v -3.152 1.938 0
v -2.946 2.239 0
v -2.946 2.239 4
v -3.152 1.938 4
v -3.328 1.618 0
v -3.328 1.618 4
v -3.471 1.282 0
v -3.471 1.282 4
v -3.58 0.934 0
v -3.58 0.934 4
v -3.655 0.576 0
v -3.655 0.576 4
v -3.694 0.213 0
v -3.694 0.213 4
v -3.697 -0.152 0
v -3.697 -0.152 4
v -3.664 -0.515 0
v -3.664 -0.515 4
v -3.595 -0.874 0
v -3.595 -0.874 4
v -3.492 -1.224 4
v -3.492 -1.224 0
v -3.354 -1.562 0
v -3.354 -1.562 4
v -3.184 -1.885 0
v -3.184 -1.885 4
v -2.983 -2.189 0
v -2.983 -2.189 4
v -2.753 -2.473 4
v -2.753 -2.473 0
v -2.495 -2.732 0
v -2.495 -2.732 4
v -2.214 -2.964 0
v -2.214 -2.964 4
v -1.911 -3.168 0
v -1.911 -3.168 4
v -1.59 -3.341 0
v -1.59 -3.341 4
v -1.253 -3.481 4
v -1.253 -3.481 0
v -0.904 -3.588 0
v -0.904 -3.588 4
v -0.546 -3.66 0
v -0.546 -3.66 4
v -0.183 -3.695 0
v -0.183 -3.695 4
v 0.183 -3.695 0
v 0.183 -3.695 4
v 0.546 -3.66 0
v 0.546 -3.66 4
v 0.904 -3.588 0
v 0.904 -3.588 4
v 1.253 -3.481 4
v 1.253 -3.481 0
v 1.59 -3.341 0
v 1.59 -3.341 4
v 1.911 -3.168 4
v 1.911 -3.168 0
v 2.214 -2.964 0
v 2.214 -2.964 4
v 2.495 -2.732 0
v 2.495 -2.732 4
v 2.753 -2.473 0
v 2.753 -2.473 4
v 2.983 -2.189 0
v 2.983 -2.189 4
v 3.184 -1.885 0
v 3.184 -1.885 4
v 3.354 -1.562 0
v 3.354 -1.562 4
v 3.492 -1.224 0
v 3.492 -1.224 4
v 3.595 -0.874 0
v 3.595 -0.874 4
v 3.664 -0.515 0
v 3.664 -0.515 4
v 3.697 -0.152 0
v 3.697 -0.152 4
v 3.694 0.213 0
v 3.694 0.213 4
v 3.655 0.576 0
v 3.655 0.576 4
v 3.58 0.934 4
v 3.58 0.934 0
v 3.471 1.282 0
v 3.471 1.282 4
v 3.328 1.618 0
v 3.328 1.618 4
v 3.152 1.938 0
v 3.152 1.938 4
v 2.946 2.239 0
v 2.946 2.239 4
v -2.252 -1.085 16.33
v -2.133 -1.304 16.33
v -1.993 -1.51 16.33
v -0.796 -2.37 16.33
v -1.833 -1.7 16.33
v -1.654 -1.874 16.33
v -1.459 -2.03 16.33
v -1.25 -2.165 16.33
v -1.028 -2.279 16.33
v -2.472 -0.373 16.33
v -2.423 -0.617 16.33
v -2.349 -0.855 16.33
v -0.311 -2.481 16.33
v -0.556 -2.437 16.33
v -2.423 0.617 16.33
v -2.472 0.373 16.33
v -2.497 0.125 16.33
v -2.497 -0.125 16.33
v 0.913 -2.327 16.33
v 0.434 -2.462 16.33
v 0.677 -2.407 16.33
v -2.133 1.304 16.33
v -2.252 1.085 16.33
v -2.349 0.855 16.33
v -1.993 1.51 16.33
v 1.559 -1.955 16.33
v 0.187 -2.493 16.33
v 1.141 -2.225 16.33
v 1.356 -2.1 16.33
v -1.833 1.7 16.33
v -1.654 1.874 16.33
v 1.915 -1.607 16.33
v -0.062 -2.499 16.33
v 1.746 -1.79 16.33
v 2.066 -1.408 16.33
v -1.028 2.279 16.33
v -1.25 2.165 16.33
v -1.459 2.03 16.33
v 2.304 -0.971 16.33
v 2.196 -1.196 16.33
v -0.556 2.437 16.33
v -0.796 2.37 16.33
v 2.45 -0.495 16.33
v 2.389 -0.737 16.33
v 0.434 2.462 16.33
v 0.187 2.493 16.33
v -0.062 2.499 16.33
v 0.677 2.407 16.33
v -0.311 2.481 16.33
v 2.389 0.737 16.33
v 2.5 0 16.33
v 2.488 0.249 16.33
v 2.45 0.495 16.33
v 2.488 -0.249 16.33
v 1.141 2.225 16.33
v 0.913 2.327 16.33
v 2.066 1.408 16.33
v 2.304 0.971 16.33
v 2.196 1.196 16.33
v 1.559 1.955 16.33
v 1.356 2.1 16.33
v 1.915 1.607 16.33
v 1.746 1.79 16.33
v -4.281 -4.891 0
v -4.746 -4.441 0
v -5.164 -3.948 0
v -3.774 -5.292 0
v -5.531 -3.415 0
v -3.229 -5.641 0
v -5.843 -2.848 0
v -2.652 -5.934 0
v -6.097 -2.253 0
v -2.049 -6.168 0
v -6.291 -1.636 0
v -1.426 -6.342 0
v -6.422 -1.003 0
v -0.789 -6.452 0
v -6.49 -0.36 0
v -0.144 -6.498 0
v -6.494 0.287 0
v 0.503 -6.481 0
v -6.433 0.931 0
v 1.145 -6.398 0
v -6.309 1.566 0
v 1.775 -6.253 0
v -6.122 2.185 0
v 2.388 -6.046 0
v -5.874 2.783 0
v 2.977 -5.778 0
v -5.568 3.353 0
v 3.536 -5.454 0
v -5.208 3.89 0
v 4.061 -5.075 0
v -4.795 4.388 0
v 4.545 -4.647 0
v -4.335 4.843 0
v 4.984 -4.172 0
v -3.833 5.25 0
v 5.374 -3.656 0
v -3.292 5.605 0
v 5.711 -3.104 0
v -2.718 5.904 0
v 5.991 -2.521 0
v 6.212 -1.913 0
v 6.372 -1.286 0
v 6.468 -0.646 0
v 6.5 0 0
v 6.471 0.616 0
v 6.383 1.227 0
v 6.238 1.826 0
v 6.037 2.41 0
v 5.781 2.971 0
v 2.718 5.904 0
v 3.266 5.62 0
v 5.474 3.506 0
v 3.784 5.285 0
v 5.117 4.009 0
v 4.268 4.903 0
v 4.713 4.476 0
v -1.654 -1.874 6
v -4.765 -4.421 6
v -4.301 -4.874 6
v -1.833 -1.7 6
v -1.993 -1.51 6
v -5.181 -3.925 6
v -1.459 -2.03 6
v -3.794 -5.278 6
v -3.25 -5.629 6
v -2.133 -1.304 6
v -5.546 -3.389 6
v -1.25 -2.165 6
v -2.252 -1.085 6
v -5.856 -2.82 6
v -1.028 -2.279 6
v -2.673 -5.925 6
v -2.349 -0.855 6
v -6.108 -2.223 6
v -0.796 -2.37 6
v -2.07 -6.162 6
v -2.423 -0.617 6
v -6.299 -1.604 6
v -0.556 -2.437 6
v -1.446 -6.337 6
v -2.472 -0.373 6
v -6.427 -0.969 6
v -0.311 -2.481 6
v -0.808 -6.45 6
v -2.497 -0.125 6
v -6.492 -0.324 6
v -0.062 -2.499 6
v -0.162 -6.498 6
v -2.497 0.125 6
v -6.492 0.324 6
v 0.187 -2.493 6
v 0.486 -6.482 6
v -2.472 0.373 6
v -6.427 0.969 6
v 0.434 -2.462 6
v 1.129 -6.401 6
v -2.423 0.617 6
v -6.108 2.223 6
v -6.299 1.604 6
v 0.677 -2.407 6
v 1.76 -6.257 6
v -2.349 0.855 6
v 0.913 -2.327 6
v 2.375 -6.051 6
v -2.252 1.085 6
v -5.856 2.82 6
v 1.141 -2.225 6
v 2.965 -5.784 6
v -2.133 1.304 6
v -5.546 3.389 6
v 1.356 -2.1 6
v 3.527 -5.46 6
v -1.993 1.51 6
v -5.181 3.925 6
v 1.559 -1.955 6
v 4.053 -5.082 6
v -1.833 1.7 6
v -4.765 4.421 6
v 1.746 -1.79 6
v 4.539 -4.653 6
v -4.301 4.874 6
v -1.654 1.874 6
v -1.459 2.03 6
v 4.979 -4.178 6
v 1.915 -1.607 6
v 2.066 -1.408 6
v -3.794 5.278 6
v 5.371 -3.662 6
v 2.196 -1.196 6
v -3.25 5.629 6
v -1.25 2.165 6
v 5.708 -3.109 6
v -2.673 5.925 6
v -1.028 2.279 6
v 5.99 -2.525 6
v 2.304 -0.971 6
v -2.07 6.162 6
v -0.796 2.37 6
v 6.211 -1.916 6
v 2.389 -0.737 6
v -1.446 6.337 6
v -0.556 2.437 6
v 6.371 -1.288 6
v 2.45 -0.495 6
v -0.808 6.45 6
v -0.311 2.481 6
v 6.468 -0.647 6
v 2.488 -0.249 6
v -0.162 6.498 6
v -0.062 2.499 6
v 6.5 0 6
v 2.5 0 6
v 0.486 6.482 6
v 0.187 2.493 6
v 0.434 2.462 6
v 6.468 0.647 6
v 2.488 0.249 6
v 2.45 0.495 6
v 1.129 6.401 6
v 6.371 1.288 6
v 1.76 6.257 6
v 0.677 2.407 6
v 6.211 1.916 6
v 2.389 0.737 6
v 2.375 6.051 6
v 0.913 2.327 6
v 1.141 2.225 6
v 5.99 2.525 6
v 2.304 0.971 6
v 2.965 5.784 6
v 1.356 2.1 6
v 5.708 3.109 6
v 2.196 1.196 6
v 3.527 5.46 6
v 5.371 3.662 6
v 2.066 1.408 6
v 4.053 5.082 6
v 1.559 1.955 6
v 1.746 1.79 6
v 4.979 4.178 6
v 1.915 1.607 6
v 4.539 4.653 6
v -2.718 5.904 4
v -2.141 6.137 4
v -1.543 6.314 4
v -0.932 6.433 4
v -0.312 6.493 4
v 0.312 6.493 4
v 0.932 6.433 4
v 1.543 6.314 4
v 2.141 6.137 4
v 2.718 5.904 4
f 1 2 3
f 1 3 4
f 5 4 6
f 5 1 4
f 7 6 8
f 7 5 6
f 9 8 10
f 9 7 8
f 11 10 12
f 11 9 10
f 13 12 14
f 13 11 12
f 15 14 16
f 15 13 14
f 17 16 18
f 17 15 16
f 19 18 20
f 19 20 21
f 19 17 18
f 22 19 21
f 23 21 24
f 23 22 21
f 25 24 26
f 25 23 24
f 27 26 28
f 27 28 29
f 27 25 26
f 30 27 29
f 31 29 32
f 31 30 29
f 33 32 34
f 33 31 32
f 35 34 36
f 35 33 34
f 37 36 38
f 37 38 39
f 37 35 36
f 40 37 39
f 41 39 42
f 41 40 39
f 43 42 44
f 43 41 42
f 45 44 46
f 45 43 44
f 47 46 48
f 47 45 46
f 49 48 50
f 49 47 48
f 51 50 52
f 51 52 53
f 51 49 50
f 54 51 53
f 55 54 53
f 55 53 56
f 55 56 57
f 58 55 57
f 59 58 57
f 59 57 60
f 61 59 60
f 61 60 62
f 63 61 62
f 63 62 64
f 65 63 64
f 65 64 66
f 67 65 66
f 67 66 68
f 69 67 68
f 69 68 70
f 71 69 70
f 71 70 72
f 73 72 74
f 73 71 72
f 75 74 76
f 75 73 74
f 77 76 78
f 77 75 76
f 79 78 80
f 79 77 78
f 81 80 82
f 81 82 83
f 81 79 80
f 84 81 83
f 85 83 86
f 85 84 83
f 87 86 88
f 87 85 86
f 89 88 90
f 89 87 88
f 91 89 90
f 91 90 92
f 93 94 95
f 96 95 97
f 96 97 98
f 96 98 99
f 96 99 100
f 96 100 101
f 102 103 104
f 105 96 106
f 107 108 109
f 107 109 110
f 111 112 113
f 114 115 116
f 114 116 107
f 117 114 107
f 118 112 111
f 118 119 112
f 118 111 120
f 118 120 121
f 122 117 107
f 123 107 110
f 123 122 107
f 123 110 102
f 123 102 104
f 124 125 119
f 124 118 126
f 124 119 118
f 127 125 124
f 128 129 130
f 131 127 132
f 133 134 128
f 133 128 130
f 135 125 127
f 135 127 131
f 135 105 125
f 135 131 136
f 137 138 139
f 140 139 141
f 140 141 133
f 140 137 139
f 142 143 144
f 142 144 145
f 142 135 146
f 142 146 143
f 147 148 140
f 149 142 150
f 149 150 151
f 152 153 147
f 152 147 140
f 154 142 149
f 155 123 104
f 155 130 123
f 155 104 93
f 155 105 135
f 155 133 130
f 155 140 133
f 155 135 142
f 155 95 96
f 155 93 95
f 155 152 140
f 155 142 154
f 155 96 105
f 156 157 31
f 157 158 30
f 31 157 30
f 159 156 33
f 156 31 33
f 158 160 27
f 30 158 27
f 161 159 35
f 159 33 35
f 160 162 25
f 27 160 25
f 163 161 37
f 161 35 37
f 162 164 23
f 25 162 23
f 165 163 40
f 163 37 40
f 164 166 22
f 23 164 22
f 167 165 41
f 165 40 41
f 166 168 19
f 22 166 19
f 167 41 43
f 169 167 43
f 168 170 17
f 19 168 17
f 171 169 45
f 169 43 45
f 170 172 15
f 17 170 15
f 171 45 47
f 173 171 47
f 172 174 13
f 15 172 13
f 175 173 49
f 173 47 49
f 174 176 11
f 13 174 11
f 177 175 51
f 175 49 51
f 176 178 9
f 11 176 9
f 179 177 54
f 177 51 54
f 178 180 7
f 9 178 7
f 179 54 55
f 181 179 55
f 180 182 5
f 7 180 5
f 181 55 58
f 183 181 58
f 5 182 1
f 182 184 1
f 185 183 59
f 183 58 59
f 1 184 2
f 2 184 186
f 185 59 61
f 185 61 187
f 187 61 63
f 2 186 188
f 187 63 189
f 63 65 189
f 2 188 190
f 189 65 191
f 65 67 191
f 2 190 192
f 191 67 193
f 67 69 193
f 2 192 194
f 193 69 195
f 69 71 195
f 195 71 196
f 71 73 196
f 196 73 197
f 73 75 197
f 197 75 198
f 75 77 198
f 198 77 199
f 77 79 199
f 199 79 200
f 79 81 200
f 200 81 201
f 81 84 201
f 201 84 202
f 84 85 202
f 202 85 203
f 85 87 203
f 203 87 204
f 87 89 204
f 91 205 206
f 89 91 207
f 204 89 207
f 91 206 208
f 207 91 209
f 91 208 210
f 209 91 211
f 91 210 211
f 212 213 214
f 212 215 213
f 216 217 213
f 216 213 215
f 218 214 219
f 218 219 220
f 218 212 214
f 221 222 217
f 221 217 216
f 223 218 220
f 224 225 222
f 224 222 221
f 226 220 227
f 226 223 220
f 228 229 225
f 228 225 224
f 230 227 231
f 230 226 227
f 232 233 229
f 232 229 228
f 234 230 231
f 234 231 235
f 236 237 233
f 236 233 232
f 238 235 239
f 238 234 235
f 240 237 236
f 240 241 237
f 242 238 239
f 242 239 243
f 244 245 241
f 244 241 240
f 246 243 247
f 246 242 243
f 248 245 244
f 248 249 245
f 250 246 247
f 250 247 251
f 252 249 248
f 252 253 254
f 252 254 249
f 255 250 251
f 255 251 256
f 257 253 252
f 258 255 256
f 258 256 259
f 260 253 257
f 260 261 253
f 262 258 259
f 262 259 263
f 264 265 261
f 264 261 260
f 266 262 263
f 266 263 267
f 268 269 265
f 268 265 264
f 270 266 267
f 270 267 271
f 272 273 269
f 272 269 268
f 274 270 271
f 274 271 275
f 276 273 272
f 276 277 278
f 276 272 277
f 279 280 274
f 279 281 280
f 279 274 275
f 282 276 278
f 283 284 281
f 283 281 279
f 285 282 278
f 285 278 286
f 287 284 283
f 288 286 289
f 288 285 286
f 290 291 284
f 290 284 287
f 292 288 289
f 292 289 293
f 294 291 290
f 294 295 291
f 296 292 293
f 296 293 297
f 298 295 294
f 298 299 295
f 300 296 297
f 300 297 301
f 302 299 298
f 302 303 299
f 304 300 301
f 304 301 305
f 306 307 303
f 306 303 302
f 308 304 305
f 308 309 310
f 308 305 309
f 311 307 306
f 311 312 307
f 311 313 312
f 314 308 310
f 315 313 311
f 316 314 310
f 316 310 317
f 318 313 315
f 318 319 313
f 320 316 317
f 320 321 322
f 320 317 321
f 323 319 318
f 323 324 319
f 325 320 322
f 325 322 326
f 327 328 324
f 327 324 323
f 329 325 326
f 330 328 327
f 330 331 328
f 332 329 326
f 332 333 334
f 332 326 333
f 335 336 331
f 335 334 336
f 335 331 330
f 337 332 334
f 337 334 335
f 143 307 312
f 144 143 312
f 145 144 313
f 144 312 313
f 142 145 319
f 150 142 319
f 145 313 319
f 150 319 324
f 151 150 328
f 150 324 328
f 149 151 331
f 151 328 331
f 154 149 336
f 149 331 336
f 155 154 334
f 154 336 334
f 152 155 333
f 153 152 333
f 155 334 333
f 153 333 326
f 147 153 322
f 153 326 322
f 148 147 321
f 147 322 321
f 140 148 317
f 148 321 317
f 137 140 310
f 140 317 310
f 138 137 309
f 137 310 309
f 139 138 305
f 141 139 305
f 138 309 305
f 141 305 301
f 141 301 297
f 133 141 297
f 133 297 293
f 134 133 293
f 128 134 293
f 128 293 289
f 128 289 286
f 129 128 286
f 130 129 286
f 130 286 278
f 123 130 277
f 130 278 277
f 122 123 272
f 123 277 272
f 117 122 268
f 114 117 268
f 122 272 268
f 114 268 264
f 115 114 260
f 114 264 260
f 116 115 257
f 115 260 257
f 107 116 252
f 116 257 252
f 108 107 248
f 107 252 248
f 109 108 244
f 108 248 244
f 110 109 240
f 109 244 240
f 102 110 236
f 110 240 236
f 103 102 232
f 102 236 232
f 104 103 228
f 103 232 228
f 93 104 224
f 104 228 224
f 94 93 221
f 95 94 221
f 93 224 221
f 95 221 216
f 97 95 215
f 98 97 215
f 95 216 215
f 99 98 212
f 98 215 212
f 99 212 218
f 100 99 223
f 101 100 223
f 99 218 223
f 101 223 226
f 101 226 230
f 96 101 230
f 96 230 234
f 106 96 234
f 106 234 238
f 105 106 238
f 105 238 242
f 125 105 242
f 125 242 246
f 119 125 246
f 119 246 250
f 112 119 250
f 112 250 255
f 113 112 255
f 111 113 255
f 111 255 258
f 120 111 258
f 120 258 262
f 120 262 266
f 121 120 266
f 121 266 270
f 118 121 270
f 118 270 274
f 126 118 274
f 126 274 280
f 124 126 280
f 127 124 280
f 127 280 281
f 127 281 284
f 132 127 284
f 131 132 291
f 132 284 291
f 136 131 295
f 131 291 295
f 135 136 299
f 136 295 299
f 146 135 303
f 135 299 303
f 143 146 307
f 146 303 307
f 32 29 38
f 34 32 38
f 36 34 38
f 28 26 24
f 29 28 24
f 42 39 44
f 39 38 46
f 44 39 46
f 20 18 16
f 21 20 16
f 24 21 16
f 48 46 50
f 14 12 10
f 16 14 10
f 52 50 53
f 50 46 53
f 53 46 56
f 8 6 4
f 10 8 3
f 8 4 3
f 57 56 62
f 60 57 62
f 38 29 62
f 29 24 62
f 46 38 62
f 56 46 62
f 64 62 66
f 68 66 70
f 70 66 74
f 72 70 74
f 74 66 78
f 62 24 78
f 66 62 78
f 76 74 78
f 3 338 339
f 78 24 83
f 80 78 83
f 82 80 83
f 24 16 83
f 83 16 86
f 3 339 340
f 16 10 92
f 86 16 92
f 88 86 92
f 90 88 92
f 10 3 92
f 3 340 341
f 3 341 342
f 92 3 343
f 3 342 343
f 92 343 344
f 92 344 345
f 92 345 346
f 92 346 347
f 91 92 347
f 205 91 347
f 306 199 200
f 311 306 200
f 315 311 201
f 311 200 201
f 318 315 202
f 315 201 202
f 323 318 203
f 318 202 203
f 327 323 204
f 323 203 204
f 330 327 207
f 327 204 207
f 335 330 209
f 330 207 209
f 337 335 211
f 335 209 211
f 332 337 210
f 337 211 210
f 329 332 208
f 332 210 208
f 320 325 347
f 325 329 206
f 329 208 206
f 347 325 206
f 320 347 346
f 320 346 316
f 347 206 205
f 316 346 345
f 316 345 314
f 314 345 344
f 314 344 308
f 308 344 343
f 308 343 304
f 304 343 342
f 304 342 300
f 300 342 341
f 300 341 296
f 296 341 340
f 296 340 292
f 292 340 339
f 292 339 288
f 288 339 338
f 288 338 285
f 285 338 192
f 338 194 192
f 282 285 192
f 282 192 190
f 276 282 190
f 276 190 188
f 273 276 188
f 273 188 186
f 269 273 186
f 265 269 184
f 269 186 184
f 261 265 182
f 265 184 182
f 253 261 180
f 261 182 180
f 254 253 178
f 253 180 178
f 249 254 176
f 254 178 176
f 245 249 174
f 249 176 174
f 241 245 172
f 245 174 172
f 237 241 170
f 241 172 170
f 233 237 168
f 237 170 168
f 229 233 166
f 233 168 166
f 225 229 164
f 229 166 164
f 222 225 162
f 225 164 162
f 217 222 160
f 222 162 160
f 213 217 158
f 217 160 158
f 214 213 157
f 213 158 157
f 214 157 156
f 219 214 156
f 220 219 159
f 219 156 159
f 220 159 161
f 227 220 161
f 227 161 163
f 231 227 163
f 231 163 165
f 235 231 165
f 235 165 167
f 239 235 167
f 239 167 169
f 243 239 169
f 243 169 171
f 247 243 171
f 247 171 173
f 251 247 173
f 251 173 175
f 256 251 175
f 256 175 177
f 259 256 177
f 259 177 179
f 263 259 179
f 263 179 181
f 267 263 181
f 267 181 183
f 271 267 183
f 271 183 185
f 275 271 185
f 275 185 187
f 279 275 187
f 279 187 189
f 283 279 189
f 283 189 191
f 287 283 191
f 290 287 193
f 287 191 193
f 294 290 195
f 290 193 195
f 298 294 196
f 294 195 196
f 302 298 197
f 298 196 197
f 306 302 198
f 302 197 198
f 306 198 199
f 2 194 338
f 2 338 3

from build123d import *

# Parameters (mm, degrees)
SKETCH4_R           = 6.5
BOSS_EXTRUDE1_DEPTH = 6
CUT_EXTRUDE2_DEPTH  = 4
SKETCH7_R           = 2.5
BOSS_EXTRUDE2_DEPTH = 10.33


with BuildPart() as part:
    # Sketch4 → Boss-Extrude1 (new body)
    with BuildSketch(Plane.XY):
        Circle(SKETCH4_R)
    extrude(amount=BOSS_EXTRUDE1_DEPTH)

    # Sketch6 → Cut-Extrude2 (cut)
    with BuildSketch(Plane.XY):
        with BuildLine():
            Line((2.945810333, 2.23879465), (2.718410219, 5.90425659))
            ThreePointArc((2.718410219, 5.90425659), (0, 6.5), (-2.718410219, 5.90425659))
            Line((-2.718410219, 5.90425659), (-2.945810333, 2.23879465))
            ThreePointArc((-2.945810333, 2.23879465), (0, -3.7), (2.945810333, 2.23879465))
        make_face()
    extrude(amount=CUT_EXTRUDE2_DEPTH, mode=Mode.SUBTRACT)

    # Sketch7 → Boss-Extrude2 (add)
    with BuildSketch(Plane.XY.offset(6)):
        Circle(SKETCH7_R)
    extrude(amount=BOSS_EXTRUDE2_DEPTH)


solid = part.part
